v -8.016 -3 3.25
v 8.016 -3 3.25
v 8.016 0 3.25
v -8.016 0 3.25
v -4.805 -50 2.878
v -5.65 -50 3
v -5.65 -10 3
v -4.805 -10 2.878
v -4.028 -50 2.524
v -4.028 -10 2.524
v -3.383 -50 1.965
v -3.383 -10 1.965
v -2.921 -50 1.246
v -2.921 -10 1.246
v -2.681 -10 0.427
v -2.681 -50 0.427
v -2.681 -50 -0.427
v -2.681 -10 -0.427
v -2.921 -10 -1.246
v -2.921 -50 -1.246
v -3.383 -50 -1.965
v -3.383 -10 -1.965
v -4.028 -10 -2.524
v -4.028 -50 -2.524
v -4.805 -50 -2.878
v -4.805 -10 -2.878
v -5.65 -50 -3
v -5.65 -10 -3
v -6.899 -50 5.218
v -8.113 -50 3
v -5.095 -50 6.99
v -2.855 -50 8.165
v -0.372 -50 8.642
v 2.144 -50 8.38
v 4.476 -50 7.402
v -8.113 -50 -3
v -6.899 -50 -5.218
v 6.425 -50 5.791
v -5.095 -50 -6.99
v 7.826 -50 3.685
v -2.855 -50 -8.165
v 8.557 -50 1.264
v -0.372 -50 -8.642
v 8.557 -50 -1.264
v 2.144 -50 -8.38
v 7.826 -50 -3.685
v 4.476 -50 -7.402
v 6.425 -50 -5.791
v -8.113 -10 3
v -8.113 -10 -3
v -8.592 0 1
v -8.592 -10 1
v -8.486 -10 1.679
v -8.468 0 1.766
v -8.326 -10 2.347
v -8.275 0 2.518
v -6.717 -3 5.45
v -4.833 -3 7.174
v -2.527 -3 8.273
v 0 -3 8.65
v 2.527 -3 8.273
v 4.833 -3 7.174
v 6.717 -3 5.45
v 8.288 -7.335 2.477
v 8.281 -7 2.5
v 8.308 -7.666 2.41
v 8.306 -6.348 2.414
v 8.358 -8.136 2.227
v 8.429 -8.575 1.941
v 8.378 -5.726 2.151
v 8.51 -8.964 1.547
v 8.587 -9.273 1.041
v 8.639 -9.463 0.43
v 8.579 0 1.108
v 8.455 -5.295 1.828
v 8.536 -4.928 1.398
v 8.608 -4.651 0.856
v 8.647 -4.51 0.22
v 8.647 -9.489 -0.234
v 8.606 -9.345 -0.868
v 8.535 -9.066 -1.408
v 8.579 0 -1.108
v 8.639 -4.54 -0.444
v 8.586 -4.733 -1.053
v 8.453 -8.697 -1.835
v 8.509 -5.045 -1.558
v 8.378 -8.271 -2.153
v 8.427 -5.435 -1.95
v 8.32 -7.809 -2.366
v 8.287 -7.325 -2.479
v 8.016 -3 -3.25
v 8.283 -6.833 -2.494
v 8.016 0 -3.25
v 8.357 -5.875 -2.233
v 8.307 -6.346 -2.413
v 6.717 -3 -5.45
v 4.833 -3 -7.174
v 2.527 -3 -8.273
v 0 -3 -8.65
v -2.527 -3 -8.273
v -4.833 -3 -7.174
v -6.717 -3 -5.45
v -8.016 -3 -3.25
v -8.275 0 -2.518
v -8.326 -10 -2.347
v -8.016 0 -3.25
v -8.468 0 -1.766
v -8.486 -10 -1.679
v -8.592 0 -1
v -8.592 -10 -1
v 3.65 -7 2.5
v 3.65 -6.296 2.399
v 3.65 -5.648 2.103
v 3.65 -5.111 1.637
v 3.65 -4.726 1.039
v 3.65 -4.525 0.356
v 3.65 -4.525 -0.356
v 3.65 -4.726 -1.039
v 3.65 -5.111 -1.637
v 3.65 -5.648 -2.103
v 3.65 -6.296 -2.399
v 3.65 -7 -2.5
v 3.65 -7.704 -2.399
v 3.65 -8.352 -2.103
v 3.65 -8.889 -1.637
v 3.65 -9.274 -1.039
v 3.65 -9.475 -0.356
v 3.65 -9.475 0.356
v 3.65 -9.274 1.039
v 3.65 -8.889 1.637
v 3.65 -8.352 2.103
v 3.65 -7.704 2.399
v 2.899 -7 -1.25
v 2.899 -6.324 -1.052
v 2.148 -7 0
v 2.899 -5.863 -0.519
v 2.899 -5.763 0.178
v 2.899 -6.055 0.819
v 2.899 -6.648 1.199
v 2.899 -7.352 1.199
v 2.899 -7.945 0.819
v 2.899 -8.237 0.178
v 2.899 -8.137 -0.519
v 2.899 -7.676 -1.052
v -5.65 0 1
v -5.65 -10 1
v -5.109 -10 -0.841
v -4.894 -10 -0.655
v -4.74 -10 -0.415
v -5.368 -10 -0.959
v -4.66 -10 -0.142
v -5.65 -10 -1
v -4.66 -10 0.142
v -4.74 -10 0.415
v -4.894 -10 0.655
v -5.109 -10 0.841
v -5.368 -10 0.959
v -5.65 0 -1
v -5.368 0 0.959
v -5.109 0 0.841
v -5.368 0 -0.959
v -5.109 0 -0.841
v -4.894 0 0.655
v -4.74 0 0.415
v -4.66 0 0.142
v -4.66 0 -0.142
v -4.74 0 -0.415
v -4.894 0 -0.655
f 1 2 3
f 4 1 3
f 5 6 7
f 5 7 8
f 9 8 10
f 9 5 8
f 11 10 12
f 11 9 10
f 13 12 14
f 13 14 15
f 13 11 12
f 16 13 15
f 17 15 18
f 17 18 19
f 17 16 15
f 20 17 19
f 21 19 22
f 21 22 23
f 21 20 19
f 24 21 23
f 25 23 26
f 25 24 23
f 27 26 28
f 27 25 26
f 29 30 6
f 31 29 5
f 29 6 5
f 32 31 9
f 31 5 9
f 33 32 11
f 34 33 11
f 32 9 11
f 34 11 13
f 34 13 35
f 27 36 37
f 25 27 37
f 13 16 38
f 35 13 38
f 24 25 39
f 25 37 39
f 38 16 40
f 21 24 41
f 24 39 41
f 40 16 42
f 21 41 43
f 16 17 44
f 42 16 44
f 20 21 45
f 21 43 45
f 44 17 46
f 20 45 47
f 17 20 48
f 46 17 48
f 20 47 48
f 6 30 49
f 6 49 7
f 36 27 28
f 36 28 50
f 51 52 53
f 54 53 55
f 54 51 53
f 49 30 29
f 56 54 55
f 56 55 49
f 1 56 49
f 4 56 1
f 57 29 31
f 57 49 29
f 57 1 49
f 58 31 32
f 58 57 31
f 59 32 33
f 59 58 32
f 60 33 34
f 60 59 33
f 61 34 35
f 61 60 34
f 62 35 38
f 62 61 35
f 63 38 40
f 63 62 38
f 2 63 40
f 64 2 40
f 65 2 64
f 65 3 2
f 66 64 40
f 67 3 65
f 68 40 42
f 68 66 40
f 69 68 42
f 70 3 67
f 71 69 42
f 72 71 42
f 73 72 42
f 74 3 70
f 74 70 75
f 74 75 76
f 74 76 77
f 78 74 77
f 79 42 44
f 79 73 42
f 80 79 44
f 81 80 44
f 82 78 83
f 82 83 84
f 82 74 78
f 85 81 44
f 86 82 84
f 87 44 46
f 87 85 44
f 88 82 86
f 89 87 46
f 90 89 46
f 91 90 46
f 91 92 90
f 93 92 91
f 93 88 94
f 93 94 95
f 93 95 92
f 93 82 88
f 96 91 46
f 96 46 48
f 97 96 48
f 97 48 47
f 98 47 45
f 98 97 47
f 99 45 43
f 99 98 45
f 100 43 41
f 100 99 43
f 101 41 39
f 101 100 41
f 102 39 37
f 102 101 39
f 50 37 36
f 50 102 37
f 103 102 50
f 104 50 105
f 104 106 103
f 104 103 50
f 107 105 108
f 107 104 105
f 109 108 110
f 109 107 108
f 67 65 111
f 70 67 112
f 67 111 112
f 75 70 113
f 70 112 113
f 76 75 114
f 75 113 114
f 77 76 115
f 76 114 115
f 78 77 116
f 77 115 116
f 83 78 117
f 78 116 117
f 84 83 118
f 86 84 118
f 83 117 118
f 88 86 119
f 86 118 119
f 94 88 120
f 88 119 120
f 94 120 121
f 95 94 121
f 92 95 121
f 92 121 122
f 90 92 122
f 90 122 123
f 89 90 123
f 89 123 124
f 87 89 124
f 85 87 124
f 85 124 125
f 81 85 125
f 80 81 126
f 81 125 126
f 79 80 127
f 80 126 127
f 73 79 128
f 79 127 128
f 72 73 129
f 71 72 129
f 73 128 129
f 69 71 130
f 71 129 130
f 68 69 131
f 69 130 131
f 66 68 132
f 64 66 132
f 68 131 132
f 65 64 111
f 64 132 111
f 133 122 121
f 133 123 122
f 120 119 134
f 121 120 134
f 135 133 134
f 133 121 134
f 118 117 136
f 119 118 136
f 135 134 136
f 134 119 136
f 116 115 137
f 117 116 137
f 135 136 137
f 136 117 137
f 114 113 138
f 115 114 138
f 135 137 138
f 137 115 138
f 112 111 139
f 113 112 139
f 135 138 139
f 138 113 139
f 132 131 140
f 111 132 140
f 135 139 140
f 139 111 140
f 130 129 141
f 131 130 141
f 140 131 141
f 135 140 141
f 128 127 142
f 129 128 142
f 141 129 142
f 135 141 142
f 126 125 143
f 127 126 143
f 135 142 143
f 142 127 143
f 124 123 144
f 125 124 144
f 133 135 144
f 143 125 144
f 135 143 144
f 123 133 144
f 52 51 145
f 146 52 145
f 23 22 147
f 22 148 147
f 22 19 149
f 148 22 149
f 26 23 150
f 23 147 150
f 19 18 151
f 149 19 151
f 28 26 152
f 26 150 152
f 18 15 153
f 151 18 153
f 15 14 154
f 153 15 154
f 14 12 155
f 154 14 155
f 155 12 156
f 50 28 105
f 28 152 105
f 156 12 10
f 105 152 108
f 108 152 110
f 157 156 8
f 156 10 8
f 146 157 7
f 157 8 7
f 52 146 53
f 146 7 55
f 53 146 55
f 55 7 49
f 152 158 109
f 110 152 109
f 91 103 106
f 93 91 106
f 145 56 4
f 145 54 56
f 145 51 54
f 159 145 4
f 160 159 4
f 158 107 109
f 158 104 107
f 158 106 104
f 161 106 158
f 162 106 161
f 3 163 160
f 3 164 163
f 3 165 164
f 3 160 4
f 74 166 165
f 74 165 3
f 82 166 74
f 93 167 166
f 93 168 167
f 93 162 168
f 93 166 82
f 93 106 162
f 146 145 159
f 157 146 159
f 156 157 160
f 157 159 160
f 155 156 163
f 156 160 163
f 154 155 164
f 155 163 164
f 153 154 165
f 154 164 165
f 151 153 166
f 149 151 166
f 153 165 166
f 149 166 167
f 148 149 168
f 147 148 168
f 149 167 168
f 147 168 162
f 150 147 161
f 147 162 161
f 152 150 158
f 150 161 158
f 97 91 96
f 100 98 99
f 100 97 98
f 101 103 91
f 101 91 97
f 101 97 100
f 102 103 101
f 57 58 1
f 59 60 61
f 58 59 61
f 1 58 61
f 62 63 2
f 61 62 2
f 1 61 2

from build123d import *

# Parameters (mm, degrees)
SKETCH_1_R               = 8.65
EXTRUDE_1_DEPTH          = 50
CUT_EXTRUDE_1_DEPTH      = 40
CUT_EXTRUDE_2_DEPTH      = 51
SKETCH_4_W               = 7.4
SKETCH_4_H               = 3
CUT_EXTRUDE_3_DEPTH      = 9.65
CUT_EXTRUDE_3_DEPTH_BACK = 9.592002095
HOLE_WIZARD_M61_D        = 5
HOLE_WIZARD_M61_DEPTH    = 5
HOLE_WIZARD_M61_TIP      = 1.502151548


with BuildPart() as part:
    # Эскиз1 → Бобышка-Вытянуть1 (new body)
    with BuildSketch(Plane(origin=(0, 0, 0), x_dir=(1, 0, 0), z_dir=(0, 1, 0))):
        Circle(SKETCH_1_R)
    extrude(amount=-EXTRUDE_1_DEPTH)

    # Эскиз2 → Вырез-Вытянуть1 (cut)
    with BuildSketch(Plane.XZ.offset(50)):
        with BuildLine():
            Line((-5.65, -3), (-8.65, -3))
            ThreePointArc((-8.65, -3), (-11.65, 0), (-8.65, 3))
            Line((-8.65, 3), (-5.65, 3))
            ThreePointArc((-5.65, 3), (-2.65, 0), (-5.65, -3))
        make_face()
    extrude(amount=-CUT_EXTRUDE_1_DEPTH, mode=Mode.SUBTRACT)

    # Эскиз3 → Вырез-Вытянуть2 (cut, through all)
    with BuildSketch(Plane.XZ):
        with BuildLine():
            Line((-5.65, -1), (-8.65, -1))
            ThreePointArc((-8.65, -1), (-9.65, 0), (-8.65, 1))
            Line((-8.65, 1), (-5.65, 1))
            ThreePointArc((-5.65, 1), (-4.65, 0), (-5.65, -1))
        make_face()
    extrude(amount=CUT_EXTRUDE_2_DEPTH, mode=Mode.SUBTRACT)

    # Эскиз4 → Вырез-Вытянуть3 (cut, two sides)
    with BuildSketch(Plane(origin=(0, 0, 0), x_dir=(0, 0, -1), z_dir=(1, 0, 0))) as cut_extrude_3_sk:
        with Locations((6.95, -1.5)):
            Rectangle(SKETCH_4_W, SKETCH_4_H)
        with Locations((-6.95, -1.5)):
            Rectangle(SKETCH_4_W, SKETCH_4_H)
    extrude(amount=CUT_EXTRUDE_3_DEPTH, mode=Mode.SUBTRACT)
    extrude(cut_extrude_3_sk.sketch, amount=-CUT_EXTRUDE_3_DEPTH_BACK, mode=Mode.SUBTRACT)

    # Отверстие обработанное метчиком M61
    with Locations(Plane(origin=(8.65, 0, 0), x_dir=(0, 0, -1), z_dir=(1, 0, 0))):
        with Locations((0, -7)):
            Hole(HOLE_WIZARD_M61_D / 2, depth=HOLE_WIZARD_M61_DEPTH)
            with Locations((0, 0, -(HOLE_WIZARD_M61_DEPTH + HOLE_WIZARD_M61_TIP / 2))):  # 118° drill point
                Cone(0, HOLE_WIZARD_M61_D / 2, HOLE_WIZARD_M61_TIP, mode=Mode.SUBTRACT)


solid = part.part
